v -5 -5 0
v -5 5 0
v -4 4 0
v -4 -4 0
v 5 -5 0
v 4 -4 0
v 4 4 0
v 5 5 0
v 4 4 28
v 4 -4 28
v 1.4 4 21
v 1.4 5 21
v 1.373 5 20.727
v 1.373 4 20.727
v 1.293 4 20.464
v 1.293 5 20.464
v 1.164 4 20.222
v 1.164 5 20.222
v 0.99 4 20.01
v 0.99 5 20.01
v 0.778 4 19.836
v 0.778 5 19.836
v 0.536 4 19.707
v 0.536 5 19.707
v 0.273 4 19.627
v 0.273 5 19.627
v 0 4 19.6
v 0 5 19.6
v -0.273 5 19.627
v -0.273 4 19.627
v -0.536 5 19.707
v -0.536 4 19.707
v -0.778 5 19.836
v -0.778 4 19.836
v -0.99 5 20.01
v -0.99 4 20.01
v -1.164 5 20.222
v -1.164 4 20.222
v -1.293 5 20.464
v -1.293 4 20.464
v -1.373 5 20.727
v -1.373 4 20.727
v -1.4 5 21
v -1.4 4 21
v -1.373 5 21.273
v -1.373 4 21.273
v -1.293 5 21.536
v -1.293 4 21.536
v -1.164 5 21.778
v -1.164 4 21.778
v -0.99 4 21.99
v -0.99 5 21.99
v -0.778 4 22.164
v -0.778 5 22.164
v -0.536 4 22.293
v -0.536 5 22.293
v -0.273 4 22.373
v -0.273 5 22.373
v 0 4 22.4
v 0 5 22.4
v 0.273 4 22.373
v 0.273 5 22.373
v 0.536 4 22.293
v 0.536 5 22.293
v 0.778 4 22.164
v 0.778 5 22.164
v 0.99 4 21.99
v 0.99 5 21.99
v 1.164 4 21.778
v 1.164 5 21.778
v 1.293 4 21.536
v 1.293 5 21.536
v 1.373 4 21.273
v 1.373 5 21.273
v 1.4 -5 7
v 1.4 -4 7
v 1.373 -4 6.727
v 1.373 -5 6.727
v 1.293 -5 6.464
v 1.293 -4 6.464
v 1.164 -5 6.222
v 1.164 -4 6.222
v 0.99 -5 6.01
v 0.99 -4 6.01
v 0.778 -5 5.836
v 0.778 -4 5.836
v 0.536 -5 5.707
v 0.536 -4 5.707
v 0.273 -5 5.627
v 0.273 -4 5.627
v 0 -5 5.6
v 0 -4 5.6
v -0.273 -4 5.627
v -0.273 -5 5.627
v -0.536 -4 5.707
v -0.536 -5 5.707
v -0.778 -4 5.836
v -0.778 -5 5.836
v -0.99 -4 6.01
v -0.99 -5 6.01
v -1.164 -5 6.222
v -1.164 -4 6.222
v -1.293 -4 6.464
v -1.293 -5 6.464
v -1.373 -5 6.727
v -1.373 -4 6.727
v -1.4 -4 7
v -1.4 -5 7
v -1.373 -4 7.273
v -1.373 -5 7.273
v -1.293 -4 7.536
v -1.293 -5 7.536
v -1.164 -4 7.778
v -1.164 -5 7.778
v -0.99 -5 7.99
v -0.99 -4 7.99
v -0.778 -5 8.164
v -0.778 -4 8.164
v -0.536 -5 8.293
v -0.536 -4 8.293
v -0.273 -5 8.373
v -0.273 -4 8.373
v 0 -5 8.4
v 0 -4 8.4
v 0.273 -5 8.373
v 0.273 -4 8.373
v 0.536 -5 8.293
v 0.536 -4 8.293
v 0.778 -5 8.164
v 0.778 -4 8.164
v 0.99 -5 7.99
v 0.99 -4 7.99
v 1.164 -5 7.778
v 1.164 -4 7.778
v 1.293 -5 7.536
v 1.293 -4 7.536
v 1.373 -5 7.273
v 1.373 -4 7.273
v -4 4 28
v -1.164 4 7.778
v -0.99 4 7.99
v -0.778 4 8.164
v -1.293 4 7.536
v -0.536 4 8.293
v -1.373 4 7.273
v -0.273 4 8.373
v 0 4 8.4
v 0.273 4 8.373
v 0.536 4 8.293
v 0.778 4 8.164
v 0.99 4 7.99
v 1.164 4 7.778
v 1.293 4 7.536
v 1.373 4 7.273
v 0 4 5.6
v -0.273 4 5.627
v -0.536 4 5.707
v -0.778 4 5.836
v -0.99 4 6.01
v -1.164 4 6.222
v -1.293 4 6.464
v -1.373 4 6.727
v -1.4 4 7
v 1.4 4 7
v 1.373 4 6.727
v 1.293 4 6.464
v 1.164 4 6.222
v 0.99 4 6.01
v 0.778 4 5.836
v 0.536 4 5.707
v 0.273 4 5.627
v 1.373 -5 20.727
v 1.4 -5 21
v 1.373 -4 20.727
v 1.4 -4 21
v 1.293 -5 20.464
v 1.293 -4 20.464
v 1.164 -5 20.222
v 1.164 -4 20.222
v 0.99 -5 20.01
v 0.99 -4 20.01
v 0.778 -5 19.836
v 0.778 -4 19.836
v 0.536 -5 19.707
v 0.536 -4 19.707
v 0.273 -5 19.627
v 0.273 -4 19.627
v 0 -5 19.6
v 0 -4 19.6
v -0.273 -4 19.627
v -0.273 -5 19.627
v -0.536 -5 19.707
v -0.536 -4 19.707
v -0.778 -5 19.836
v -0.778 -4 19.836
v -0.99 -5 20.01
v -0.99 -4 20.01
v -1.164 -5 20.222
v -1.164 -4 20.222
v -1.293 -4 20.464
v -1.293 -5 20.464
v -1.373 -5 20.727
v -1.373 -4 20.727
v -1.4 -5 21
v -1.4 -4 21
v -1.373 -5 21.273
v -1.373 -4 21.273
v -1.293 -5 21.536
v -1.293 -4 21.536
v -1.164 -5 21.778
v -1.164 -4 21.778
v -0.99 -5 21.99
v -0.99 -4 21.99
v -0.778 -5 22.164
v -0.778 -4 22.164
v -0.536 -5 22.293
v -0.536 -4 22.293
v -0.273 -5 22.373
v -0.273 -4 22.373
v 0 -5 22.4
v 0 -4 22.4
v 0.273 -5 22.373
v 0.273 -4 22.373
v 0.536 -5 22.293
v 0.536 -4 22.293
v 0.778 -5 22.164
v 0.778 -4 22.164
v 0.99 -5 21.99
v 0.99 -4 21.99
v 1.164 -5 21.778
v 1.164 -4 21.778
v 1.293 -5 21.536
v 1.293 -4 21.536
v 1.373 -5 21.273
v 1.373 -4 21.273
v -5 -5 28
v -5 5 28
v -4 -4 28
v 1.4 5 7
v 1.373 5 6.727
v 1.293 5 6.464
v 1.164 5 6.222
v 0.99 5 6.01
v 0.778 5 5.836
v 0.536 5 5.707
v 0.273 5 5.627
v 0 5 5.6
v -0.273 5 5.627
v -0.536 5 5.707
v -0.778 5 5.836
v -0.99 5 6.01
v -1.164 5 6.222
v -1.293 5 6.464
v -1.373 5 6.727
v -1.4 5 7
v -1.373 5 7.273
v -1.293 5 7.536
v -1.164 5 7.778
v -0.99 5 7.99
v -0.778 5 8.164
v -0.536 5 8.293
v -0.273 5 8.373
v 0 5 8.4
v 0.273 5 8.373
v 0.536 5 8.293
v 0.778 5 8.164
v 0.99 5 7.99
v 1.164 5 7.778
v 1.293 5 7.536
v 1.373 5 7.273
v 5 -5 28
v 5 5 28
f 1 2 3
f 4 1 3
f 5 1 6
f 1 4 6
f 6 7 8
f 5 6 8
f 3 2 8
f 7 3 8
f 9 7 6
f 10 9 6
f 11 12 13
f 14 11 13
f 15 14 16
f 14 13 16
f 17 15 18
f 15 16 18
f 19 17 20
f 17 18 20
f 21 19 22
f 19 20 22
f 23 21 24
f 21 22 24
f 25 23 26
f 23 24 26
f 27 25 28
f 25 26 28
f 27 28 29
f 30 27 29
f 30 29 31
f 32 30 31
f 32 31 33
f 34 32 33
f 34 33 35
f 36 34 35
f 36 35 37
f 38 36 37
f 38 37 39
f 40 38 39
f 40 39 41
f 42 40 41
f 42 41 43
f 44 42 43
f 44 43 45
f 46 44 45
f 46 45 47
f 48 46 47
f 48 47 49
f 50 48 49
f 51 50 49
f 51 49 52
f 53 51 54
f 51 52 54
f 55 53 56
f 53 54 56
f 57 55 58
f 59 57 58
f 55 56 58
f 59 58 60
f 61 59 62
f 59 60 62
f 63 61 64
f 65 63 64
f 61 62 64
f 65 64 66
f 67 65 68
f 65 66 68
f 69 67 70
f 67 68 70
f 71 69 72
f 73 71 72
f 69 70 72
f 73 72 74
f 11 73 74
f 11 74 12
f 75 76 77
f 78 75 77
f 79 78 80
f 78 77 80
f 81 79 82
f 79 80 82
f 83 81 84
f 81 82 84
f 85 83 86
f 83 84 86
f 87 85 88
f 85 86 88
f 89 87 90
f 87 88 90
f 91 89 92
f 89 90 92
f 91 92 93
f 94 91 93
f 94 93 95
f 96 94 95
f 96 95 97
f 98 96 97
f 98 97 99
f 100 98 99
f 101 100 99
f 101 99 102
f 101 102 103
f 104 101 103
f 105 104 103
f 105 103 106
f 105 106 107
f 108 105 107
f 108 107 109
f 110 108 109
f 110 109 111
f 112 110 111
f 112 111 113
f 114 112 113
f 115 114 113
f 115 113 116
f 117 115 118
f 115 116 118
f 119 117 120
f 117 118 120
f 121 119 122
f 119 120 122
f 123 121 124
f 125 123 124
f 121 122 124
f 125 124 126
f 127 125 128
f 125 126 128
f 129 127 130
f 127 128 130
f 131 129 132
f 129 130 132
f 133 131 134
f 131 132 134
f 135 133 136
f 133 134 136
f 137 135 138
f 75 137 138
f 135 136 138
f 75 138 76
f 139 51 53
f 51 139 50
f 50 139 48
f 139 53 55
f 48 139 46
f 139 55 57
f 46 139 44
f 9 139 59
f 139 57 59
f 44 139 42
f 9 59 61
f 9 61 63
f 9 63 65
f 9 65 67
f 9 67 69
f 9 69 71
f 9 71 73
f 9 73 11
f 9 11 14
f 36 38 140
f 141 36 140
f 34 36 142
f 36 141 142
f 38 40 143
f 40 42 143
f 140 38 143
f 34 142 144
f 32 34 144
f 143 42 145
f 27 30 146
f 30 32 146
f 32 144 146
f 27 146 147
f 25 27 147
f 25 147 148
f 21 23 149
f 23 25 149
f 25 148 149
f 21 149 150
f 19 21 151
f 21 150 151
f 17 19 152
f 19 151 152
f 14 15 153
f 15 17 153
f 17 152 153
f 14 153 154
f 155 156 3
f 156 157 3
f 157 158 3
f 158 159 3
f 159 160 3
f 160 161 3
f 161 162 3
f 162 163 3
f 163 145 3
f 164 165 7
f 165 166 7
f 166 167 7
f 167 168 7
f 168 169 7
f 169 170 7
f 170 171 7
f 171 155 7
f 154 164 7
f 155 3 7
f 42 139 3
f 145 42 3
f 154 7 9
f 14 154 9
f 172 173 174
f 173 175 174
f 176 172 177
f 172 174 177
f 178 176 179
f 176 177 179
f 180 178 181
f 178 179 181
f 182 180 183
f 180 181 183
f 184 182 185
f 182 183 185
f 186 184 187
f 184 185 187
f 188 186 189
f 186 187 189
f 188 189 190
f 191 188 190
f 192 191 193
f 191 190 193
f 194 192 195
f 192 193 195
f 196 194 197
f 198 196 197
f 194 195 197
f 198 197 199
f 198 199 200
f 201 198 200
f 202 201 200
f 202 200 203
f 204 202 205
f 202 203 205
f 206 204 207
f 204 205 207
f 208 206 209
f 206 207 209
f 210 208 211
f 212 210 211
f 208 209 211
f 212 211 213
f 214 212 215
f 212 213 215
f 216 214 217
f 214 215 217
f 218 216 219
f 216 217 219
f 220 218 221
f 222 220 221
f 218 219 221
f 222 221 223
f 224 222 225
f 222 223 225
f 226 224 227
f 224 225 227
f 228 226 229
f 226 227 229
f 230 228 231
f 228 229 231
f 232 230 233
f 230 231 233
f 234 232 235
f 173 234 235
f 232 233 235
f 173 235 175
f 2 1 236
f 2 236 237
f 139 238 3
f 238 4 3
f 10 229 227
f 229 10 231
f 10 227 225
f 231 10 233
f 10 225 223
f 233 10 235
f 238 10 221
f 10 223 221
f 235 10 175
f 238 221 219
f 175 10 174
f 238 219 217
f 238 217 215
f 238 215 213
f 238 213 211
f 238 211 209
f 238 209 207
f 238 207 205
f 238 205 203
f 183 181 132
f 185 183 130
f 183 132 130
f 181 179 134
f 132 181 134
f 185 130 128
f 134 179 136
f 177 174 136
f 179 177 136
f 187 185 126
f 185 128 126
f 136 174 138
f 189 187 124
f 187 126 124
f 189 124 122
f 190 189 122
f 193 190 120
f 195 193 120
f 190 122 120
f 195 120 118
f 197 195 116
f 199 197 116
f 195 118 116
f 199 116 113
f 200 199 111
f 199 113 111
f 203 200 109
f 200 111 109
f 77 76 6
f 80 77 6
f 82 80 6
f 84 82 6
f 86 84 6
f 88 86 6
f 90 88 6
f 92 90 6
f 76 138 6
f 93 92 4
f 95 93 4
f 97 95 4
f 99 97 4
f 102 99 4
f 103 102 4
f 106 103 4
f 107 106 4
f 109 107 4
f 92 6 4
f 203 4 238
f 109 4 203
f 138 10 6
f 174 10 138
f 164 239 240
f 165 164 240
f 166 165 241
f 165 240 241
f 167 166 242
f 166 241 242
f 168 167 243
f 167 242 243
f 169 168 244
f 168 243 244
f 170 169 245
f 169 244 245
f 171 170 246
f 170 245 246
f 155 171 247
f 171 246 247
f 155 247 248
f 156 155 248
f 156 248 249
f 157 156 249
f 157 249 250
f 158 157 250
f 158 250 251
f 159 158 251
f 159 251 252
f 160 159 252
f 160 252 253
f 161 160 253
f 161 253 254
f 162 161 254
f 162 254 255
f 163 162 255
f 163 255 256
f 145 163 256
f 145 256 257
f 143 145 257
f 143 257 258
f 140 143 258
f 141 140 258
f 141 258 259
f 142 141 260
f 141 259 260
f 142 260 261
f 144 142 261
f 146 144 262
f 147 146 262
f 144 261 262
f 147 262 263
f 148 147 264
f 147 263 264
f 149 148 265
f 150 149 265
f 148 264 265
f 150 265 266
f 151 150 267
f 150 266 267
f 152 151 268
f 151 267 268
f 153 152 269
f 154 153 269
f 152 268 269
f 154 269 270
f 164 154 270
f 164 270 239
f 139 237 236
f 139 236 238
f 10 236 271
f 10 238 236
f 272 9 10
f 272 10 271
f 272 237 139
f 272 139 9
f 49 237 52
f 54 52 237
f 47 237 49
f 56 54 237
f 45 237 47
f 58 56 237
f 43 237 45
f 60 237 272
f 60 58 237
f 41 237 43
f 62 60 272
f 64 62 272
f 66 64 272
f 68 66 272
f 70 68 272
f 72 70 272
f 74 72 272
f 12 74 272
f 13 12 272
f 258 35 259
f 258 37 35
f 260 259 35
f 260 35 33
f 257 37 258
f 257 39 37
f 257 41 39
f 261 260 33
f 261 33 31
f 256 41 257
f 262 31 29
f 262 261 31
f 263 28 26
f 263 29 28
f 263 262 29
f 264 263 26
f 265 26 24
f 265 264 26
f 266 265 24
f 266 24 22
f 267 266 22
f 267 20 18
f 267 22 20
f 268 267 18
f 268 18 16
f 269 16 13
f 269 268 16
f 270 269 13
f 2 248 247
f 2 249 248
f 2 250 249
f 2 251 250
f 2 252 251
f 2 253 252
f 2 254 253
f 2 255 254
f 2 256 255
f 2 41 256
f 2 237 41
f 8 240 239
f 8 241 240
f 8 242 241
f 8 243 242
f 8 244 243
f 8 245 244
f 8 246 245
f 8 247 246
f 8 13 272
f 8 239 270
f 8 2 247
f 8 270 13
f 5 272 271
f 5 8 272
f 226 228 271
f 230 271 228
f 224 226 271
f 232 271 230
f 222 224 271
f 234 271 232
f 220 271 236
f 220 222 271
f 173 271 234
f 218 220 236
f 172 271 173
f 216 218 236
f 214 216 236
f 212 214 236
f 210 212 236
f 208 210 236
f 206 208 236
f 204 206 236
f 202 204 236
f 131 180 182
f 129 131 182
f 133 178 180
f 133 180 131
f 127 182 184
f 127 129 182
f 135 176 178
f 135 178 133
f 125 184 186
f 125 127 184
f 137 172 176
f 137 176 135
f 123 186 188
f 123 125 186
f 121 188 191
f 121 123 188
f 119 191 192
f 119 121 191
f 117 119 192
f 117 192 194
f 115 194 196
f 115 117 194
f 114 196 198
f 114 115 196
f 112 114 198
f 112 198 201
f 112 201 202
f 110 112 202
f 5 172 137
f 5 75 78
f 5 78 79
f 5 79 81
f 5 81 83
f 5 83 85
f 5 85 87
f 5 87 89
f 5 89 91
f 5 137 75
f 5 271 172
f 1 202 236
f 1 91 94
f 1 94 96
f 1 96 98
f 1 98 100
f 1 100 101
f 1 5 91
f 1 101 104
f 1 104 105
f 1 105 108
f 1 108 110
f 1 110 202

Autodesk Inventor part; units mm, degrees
ref_plane "YZ Plane" through (0, 0, 0) normal (1, 0, 0) x (0, 1, 0)
ref_plane "XZ Plane" through (0, 0, 0) normal (0, 1, 0) x (-1, 0, 0)
ref_plane "XY Plane" through (0, 0, 0) normal (0, 0, 1) x (1, 0, 0)
sketch "スケッチ1" plane through (0, 0, 0) normal (0, 0, 1) x (1, 0, 0)
  line L0 (-5, 5) -> (5, 5)
  line L1 (5, 5) -> (5, -5)
  line L2 (5, -5) -> (-5, -5)
  line L3 (-5, -5) -> (-5, 5)
  line L4 (-5, 5) -> (5, -5) construction
  line L5 (5, 5) -> (-5, -5) construction
  line L6 (-4, 4) -> (4, 4)
  line L7 (4, 4) -> (4, -4)
  line L8 (4, -4) -> (-4, -4)
  line L9 (-4, -4) -> (-4, 4)
  line L10 (-4, 4) -> (4, -4) construction
  line L11 (4, 4) -> (-4, -4) construction
  point P0 (0, 0)
  dimension "d0" = 10
  dimension "d1" = 10
  dimension "d2" = 8
extrude "押し出し1" add sketch "スケッチ1" along normal blind 28
sketch "スケッチ2" plane through (-5, 5, 0) normal (0, 1, 0) x (1, 0, 0)
  circle A0 centre (5, -7) radius 1.4 projected
  line L0 (0, 0) -> (0, -28) projected
  line L1 (0, -14) -> (10, -14)
  line L2 (10, 0) -> (10, -28) projected
  circle A1 centre (5, -21) radius 1.4
  point P0 (5, 0)
extrude "押し出し2" cut sketch "スケッチ2" against normal through all
properties part number "position_setter_bar" material "アルミニウム 6061"
